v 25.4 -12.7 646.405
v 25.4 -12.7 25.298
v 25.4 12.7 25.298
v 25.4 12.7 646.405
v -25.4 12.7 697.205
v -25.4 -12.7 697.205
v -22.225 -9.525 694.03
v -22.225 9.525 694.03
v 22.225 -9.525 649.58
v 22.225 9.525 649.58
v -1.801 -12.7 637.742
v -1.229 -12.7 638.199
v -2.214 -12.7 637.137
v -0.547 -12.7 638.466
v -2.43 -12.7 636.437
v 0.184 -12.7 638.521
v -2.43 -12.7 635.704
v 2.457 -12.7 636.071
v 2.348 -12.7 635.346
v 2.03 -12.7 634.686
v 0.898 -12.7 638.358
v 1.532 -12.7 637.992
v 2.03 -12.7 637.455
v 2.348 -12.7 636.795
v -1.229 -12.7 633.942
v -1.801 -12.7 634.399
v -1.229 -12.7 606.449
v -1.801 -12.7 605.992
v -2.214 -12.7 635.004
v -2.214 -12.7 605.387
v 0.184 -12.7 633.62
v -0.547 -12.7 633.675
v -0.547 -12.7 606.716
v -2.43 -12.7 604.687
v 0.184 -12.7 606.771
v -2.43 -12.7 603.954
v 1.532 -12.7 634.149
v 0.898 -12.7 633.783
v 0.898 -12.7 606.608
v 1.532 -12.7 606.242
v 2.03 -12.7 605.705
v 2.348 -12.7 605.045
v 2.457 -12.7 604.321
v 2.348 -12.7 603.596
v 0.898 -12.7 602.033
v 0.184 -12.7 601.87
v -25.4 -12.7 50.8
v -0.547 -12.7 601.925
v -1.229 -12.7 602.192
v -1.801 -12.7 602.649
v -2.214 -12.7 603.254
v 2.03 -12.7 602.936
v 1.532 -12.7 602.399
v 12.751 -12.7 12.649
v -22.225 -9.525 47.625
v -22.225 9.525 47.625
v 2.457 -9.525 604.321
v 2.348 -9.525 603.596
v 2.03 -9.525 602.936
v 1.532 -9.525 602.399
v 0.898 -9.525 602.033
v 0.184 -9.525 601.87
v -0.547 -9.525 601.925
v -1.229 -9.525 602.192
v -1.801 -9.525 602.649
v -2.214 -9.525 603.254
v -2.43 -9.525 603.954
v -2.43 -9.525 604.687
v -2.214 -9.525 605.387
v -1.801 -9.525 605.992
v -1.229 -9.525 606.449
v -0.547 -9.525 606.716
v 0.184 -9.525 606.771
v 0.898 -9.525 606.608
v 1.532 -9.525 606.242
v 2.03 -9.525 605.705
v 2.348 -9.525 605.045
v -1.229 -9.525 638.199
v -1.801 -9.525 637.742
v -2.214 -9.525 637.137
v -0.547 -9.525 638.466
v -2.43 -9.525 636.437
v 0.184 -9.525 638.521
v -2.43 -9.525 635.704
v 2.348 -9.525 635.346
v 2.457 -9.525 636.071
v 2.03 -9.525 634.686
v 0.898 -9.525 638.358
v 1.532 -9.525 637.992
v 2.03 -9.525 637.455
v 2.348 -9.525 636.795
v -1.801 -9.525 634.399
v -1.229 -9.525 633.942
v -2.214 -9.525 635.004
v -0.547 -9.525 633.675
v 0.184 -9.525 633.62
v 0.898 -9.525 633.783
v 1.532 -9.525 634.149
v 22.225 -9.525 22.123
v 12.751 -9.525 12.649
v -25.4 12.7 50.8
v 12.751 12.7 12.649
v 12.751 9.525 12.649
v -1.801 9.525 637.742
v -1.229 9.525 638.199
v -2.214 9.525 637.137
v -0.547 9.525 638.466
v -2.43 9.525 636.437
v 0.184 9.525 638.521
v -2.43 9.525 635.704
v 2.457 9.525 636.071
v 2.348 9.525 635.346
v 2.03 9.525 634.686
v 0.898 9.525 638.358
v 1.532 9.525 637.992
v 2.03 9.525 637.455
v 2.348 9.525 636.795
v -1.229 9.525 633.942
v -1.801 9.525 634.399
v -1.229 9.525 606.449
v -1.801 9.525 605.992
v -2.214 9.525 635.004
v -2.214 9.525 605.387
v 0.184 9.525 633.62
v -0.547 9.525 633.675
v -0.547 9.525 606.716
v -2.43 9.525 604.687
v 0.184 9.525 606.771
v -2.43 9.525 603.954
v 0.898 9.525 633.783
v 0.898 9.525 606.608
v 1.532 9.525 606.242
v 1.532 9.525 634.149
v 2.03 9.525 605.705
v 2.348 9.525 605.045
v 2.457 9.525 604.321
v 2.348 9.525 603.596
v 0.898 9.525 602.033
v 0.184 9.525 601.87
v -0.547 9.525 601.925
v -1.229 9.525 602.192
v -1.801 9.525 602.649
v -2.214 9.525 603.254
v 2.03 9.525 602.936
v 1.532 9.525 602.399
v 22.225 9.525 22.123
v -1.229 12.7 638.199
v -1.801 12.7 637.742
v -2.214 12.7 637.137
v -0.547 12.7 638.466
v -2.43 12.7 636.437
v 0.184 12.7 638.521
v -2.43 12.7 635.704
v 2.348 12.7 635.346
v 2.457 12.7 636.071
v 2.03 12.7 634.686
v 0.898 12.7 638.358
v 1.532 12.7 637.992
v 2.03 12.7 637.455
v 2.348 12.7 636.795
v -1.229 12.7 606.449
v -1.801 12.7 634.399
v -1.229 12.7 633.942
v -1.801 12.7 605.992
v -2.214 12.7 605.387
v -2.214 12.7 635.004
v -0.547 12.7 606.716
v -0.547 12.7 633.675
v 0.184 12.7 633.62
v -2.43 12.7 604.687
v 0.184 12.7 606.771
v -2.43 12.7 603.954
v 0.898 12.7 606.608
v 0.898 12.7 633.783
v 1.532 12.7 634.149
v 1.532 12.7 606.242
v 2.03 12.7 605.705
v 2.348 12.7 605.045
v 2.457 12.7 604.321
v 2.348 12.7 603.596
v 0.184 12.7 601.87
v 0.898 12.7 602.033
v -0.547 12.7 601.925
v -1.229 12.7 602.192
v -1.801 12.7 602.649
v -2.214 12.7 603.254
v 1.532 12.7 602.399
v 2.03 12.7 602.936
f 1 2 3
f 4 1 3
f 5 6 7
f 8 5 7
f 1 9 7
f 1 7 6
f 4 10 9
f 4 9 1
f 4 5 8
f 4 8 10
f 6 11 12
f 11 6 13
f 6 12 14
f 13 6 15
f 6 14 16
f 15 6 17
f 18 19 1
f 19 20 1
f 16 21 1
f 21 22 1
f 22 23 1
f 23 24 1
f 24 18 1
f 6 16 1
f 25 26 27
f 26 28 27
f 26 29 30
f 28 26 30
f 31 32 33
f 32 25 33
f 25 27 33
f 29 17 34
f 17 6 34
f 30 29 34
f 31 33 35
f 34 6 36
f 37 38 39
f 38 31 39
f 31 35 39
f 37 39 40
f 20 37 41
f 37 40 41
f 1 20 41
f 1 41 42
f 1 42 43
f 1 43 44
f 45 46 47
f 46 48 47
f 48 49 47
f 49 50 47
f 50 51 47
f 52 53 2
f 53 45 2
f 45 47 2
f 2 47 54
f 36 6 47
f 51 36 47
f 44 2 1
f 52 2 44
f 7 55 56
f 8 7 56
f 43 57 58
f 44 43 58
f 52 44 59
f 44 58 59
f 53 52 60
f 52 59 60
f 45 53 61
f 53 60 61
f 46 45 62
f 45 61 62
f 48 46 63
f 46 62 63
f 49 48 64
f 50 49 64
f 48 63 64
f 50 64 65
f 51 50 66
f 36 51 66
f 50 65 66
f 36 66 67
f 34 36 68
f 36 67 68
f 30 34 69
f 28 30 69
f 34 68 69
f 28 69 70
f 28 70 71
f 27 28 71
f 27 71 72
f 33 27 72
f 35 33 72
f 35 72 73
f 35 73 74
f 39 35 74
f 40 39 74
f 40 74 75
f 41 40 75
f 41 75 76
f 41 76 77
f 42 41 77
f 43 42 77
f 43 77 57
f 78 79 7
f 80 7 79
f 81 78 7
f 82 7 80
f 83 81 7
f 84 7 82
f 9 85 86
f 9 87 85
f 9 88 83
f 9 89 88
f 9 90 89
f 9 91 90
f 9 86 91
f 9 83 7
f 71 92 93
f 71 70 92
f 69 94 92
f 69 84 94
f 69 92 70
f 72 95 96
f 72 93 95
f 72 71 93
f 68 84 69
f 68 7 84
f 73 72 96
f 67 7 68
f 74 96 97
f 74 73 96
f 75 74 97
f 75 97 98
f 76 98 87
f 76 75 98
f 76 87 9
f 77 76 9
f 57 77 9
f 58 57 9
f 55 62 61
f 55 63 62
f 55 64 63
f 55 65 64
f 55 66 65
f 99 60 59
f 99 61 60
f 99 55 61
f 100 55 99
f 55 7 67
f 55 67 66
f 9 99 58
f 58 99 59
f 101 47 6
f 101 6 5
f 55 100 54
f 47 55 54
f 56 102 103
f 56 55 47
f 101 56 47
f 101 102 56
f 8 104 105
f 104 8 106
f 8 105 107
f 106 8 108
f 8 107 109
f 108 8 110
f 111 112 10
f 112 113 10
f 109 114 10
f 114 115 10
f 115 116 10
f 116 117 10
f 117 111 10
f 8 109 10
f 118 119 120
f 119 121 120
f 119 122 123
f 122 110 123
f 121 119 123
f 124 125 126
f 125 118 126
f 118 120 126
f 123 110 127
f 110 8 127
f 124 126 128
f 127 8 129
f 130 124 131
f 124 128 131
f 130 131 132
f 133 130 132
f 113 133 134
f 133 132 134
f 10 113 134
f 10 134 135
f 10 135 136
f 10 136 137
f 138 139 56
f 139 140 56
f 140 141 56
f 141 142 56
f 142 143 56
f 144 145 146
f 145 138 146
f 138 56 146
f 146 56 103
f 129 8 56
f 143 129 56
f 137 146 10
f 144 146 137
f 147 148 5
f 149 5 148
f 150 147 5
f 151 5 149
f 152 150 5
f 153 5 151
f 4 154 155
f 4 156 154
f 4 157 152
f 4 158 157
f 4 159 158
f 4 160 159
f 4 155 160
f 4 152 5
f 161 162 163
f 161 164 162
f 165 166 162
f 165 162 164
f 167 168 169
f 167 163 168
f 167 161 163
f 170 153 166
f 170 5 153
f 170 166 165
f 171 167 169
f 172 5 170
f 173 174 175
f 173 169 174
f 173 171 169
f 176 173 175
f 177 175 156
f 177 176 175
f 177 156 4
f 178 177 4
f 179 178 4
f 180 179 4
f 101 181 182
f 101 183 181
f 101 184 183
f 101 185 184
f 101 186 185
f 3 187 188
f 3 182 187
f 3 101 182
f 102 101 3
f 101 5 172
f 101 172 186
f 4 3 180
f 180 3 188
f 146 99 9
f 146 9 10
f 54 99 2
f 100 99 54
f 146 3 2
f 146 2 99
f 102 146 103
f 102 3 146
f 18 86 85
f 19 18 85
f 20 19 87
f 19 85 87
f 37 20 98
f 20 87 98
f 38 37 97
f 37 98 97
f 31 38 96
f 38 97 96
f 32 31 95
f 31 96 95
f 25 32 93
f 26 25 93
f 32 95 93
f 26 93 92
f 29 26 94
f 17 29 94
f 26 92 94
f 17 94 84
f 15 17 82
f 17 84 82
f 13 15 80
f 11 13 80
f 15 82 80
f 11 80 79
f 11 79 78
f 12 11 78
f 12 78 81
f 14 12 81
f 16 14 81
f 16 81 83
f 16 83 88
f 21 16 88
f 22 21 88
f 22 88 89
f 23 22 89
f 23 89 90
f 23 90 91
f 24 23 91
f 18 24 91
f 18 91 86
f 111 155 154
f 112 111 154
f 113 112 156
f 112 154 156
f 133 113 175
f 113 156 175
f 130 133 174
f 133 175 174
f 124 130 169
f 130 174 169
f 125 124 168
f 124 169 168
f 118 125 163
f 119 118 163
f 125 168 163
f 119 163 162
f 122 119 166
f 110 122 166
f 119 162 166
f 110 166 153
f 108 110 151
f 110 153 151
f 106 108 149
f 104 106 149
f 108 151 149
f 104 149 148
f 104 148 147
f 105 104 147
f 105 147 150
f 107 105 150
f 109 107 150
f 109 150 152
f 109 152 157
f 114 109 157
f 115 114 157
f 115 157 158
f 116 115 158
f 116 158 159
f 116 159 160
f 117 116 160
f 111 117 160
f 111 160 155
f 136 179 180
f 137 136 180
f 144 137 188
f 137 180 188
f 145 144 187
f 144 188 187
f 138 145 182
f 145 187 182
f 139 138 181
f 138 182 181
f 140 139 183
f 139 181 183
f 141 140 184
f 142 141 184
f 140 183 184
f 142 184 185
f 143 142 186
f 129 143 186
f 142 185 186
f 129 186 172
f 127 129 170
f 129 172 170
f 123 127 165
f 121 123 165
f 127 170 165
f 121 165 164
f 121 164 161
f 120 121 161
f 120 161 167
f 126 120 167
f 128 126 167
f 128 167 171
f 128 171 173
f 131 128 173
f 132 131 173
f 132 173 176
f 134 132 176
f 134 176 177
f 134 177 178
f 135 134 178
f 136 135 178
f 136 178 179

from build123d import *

# Parameters (mm, degrees)
SKETCH1_W                    = 50.8
SKETCH1_H                    = 25.4
SKETCH1_W_2                  = 44.45
SKETCH1_H_2                  = 19.05
BOSS_EXTRUDE1_DEPTH          = 697.2046
CUT_EXTRUDE1_DEPTH           = 699.129339207
CUT_EXTRUDE3_DEPTH           = 699.129339207
F_10_0_1935_DIAMETER_HOLE1_D = 4.9149


with BuildPart() as part:
    # Sketch1 → Boss-Extrude1 (new body)
    with BuildSketch(Plane.XY):
        Rectangle(SKETCH1_W, SKETCH1_H)
        Rectangle(SKETCH1_W_2, SKETCH1_H_2, mode=Mode.SUBTRACT)
    extrude(amount=BOSS_EXTRUDE1_DEPTH)

    # Sketch2 → Cut-Extrude1 (cut, through all)
    with BuildSketch(Plane(origin=(0, 12.7, 0), x_dir=(1, 0, 0), z_dir=(0, 1, 0))):
        Polygon((-25.4, -697.2046), (25.4, -646.4046), (25.4, -697.2046), align=None)
        Polygon((25.4, 0), (-25.4, -50.8), (-25.4, 0), align=None)
    extrude(amount=-CUT_EXTRUDE1_DEPTH, mode=Mode.SUBTRACT)

    # Sketch3 → Cut-Extrude3 (cut, through all)
    with BuildSketch(Plane(origin=(0, 12.7, 0), x_dir=(1, 0, 0), z_dir=(0, 1, 0))):
        Polygon((25.4, 0), (25.4, -25.2984), (12.7508, -12.6492), align=None)
    extrude(amount=-CUT_EXTRUDE3_DEPTH, mode=Mode.SUBTRACT)

    # #10 (0.1935) Diameter Hole1 (through all)
    with Locations(Plane(origin=(0, -12.7, 0), x_dir=(-1, 0, 0), z_dir=(0, -1, 0))):
        with Locations((0, -604.320502063), (0, -636.070502063)):
            Hole(F_10_0_1935_DIAMETER_HOLE1_D / 2)


solid = part.part
